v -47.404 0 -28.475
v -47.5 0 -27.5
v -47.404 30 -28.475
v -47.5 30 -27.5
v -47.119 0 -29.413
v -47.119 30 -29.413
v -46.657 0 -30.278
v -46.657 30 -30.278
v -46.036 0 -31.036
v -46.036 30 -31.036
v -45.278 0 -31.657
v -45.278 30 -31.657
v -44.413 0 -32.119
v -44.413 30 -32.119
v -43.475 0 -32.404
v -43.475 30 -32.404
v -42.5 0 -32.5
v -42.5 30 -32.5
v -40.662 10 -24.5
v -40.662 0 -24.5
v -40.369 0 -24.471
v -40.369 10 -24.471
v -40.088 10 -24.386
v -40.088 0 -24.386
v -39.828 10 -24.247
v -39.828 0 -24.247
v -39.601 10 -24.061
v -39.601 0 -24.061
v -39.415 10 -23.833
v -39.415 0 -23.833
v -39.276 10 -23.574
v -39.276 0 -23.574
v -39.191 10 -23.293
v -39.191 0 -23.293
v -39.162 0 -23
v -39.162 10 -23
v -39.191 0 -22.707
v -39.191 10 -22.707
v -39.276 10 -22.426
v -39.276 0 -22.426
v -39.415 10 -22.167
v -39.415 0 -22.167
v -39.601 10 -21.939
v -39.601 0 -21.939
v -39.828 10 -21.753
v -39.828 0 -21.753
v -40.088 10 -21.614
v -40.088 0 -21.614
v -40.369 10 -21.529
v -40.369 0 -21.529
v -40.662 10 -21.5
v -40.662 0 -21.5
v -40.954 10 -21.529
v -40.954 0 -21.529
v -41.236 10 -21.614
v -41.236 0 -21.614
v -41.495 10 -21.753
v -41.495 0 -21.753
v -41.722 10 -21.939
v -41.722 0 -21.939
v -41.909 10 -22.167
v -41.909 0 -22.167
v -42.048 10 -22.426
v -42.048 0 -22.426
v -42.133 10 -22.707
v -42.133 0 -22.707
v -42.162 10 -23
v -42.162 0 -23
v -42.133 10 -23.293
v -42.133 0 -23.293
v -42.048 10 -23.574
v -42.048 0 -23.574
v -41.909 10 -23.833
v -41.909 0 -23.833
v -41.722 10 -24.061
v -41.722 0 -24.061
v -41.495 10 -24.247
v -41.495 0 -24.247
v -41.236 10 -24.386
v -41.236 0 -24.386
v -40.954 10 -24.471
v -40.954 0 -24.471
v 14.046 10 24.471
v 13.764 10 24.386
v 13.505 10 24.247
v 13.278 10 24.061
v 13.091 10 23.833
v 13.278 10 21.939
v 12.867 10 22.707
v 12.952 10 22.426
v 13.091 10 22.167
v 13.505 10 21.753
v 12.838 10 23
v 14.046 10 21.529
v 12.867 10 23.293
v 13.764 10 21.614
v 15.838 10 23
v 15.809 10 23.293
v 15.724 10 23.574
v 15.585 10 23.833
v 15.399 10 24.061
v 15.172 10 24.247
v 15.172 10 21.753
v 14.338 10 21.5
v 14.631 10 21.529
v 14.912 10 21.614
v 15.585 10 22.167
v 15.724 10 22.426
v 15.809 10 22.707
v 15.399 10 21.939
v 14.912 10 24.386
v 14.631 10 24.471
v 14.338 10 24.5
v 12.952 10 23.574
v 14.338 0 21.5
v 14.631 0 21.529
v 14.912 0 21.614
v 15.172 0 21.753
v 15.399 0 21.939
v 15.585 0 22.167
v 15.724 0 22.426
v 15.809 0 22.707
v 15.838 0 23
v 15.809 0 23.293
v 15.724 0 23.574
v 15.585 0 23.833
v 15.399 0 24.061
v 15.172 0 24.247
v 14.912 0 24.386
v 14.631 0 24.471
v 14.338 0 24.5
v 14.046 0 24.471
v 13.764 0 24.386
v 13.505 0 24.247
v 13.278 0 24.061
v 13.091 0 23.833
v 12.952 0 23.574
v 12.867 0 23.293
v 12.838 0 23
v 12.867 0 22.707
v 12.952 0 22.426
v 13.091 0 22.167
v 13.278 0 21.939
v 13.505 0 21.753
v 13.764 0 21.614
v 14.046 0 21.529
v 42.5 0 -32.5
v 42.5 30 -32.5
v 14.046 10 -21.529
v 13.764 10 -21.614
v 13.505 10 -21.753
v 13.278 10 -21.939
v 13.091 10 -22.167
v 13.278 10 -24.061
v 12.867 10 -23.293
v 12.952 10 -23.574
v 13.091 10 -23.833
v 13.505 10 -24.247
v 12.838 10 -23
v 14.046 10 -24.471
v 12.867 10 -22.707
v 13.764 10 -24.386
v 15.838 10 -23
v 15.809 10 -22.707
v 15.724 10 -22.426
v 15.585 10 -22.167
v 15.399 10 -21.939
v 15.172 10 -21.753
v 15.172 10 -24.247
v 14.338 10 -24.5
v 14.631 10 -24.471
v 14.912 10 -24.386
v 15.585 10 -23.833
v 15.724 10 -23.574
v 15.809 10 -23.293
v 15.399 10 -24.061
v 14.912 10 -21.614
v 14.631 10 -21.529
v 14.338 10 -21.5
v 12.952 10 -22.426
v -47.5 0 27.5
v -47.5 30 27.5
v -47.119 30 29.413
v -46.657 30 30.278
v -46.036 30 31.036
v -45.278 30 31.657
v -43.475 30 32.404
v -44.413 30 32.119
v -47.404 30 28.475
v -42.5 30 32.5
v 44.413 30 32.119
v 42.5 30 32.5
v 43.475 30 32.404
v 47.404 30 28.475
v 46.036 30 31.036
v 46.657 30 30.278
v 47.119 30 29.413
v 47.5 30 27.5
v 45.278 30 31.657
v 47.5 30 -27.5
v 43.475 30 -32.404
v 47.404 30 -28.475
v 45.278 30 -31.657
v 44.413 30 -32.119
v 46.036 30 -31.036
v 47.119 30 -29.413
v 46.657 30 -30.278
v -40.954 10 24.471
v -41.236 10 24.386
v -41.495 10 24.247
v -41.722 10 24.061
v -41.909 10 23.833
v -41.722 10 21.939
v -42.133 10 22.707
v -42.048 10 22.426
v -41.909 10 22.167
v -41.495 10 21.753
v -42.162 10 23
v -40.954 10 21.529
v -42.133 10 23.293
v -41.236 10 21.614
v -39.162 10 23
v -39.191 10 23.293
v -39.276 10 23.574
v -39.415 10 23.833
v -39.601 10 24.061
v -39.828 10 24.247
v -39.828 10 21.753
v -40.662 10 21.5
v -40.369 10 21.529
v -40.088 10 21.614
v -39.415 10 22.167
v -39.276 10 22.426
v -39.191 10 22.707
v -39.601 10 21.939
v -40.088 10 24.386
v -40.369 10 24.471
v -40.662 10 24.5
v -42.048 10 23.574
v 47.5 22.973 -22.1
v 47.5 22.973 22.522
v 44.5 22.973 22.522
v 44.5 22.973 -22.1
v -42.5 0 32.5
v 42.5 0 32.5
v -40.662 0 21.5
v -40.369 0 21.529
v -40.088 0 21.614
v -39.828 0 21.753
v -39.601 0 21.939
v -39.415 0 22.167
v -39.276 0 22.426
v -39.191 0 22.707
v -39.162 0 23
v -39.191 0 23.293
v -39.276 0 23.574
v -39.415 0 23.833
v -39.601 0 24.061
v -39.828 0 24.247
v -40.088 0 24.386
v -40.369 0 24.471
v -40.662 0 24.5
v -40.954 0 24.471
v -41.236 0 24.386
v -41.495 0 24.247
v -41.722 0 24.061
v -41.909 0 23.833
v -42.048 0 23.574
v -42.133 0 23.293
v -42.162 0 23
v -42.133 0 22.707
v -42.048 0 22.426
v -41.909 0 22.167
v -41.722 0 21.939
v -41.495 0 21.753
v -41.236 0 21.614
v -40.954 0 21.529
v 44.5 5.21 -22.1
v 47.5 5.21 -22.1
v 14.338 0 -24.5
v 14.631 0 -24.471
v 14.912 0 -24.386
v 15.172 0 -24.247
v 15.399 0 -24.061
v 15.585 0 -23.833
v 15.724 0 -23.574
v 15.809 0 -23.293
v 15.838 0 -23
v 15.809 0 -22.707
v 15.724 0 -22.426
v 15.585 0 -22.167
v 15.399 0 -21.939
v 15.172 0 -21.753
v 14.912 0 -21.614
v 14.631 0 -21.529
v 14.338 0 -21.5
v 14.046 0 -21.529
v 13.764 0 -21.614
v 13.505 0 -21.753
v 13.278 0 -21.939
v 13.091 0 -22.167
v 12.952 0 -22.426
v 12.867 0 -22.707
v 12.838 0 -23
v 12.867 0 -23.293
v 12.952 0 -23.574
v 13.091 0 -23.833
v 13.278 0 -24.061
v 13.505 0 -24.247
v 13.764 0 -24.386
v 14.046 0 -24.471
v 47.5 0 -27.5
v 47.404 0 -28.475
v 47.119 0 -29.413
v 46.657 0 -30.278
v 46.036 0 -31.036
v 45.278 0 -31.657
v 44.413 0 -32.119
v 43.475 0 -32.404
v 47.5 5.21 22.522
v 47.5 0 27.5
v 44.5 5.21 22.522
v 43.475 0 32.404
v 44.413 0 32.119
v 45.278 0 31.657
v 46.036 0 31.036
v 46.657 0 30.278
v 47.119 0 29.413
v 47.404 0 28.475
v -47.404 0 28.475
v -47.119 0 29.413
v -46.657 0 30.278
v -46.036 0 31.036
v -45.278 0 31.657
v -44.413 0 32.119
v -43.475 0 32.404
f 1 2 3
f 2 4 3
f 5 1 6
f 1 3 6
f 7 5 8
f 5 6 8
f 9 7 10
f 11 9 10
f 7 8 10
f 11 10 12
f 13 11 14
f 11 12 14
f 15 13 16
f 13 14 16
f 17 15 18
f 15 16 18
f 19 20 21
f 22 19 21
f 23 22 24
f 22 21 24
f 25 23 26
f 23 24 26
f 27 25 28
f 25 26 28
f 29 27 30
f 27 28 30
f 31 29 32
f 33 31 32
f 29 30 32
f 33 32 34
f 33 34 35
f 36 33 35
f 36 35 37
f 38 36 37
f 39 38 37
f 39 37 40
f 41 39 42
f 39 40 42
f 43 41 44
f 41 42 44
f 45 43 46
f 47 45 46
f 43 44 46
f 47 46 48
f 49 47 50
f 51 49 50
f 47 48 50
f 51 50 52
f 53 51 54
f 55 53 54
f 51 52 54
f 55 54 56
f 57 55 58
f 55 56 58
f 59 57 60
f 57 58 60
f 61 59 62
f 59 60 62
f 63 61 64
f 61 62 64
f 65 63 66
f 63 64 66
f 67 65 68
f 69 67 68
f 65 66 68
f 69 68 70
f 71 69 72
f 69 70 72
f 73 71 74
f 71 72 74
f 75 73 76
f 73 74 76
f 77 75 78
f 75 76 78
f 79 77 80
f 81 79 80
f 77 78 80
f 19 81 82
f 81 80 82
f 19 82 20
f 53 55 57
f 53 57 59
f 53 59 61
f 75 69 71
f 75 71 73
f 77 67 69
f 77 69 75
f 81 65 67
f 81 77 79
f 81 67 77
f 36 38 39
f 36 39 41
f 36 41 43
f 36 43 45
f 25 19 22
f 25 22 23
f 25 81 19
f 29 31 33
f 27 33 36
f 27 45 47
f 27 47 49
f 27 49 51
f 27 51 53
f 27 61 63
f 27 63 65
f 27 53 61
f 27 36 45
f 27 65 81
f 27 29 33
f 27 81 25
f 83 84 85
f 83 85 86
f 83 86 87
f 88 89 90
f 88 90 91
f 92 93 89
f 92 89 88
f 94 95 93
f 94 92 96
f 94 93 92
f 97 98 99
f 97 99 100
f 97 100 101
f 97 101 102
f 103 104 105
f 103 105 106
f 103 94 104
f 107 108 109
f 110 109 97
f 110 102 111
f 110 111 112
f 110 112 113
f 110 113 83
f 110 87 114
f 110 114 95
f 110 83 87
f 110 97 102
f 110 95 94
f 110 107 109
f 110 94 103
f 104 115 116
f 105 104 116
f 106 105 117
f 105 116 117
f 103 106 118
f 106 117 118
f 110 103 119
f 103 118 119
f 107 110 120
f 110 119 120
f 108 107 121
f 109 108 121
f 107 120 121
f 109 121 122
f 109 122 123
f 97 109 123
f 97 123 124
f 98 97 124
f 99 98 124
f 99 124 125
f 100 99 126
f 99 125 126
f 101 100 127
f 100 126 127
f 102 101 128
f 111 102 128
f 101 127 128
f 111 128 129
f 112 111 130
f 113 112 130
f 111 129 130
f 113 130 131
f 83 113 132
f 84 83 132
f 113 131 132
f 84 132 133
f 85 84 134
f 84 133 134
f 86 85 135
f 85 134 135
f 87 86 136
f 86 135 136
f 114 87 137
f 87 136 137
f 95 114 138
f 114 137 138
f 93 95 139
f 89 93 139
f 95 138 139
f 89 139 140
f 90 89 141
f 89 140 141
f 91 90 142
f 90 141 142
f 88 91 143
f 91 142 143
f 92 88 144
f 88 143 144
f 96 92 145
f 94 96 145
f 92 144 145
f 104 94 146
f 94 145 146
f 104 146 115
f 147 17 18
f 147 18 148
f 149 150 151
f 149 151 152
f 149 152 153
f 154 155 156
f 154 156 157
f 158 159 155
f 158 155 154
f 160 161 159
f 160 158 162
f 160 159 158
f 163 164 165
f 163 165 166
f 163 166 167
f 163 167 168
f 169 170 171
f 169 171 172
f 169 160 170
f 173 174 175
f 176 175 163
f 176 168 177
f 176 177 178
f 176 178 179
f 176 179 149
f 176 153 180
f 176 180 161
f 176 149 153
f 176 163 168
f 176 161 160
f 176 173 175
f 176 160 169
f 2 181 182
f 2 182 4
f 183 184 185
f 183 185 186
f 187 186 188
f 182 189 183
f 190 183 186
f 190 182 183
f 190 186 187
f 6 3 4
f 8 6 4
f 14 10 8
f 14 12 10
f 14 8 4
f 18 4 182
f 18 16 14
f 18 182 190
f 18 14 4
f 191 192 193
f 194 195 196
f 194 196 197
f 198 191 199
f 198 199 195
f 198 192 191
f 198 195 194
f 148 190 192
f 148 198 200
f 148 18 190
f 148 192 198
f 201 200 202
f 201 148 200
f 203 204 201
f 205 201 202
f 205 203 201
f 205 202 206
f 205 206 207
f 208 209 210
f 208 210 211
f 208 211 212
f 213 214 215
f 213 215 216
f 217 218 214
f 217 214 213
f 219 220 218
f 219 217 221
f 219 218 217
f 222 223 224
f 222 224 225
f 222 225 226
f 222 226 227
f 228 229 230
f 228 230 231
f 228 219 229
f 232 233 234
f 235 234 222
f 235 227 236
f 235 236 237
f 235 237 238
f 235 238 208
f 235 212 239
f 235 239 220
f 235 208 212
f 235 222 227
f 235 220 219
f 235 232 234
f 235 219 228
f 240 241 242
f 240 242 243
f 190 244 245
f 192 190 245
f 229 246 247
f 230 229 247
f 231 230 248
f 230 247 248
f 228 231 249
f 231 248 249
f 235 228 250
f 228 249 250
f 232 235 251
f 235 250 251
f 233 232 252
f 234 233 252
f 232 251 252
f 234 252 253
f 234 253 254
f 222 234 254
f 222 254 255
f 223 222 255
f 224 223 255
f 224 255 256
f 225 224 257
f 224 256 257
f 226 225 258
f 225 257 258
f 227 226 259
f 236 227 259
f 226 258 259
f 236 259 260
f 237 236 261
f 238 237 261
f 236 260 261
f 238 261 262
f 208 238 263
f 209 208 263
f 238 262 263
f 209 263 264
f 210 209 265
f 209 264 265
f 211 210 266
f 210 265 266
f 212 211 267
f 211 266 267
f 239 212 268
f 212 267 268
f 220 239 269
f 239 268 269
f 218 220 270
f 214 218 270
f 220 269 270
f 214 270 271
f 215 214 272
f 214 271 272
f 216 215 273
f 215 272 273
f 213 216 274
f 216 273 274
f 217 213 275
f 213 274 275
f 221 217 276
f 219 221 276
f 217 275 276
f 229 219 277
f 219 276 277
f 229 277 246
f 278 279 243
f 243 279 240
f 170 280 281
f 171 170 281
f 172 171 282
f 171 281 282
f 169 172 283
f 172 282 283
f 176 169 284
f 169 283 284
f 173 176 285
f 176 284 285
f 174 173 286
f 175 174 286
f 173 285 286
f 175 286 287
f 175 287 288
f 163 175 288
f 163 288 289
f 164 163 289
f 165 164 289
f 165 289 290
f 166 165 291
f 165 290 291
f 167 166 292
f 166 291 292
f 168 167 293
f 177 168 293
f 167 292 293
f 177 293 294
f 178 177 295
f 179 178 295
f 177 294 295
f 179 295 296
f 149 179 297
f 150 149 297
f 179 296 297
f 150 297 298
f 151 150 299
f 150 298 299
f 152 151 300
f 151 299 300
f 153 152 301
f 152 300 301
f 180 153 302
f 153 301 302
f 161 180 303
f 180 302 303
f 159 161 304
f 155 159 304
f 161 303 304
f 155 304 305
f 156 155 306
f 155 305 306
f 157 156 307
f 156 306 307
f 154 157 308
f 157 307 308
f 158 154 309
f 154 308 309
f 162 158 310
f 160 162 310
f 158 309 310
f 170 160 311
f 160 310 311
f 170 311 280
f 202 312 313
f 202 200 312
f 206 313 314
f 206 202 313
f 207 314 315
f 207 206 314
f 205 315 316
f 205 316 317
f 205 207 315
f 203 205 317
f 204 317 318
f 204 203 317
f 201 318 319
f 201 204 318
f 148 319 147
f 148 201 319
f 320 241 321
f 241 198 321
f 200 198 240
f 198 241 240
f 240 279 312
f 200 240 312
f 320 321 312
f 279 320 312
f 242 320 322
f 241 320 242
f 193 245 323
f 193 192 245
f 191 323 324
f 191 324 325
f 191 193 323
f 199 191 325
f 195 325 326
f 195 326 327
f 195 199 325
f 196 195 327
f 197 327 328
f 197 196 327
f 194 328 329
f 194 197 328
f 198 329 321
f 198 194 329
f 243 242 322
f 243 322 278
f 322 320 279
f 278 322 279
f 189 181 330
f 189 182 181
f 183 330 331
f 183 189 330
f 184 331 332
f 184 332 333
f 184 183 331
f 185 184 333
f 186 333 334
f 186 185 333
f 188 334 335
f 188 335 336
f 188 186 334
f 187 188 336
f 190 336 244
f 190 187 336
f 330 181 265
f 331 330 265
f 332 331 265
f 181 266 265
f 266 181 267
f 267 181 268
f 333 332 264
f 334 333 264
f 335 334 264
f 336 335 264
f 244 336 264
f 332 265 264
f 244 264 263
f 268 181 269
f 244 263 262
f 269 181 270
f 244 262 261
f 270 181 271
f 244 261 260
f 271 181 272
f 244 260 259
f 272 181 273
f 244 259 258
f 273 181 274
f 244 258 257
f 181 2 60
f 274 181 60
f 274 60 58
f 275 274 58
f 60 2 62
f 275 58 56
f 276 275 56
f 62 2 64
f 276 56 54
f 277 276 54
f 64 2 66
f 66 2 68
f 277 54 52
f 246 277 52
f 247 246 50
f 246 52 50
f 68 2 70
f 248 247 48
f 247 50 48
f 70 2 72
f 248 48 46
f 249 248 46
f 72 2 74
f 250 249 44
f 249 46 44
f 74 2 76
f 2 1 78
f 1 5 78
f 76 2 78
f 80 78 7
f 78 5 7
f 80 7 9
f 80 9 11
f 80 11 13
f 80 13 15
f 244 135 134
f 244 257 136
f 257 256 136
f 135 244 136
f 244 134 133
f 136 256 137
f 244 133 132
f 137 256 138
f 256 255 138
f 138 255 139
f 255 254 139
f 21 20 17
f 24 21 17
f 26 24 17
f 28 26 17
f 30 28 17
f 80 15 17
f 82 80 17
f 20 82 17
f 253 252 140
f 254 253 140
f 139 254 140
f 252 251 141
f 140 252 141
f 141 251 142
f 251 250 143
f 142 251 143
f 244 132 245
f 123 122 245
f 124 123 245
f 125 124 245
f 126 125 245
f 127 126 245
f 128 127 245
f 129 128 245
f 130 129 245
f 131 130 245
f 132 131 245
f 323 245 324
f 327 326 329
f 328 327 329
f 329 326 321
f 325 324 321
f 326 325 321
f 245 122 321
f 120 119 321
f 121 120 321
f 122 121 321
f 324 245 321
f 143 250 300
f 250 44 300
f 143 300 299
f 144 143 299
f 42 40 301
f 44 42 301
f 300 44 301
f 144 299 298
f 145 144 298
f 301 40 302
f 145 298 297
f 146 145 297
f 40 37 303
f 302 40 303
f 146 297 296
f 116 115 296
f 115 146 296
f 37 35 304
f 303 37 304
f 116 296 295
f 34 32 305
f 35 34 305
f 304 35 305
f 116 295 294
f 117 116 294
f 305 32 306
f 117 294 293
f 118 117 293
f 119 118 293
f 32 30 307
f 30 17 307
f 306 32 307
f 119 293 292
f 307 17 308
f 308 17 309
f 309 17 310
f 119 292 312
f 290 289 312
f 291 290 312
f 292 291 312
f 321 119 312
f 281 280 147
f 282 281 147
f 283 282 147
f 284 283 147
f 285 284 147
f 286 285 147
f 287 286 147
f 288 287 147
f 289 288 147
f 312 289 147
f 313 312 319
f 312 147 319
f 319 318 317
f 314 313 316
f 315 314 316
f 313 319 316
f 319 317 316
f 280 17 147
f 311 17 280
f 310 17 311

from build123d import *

# Parameters (mm, degrees)
SKETCH_2_W          = 95
SKETCH_2_H          = 65
EXTRUDE_1_DEPTH     = 30
FILLET_1_R          = 5
SKETCH_3_R          = 1.5
CUT_EXTRUDE_1_DEPTH = 10
SKETCH_4_W          = 44.622650634
SKETCH_4_H          = 17.76241433
CUT_EXTRUDE_2_DEPTH = 3


with BuildPart() as part:
    # 草图2 → 凸台-拉伸1 (new body)
    with BuildSketch(Plane(origin=(0, 0, 0), x_dir=(1, 0, 0), z_dir=(0, 1, 0))):
        Rectangle(SKETCH_2_W, SKETCH_2_H)
    extrude(amount=EXTRUDE_1_DEPTH)

    # 圆角1
    fillet_1_edges = [part.edges().sort_by_distance(p)[0] for p in [
        (47.5, 15, 32.5),
        (-47.5, 15, 32.5),
        (-47.5, 15, -32.5),
        (47.5, 15, -32.5),
    ]]
    fillet(fillet_1_edges, radius=FILLET_1_R)

    # 草图3 → 切除-拉伸1 (cut)
    with BuildSketch(Plane.XZ):
        with Locations(Location((-40.661720084, 23, 0), (0, 0, 270))):
            Circle(SKETCH_3_R)
        with Locations(Location((-40.661720084, -23, 0), (0, 0, 270))):
            Circle(SKETCH_3_R)
        with Locations(Location((14.338279916, 23, 0), (0, 0, 270))):
            Circle(SKETCH_3_R)
        with Locations(Location((14.338279916, -23, 0), (0, 0, 270))):
            Circle(SKETCH_3_R)
    extrude(amount=-CUT_EXTRUDE_1_DEPTH, mode=Mode.SUBTRACT)

    # 草图4 → 切除-拉伸2 (cut)
    with BuildSketch(Plane(origin=(47.5, 0, 0), x_dir=(0, 0, -1), z_dir=(1, 0, 0))):
        with Locations((-0.211139555, 14.091574869)):
            Rectangle(SKETCH_4_W, SKETCH_4_H)
    extrude(amount=-CUT_EXTRUDE_2_DEPTH, mode=Mode.SUBTRACT)


solid = part.part
